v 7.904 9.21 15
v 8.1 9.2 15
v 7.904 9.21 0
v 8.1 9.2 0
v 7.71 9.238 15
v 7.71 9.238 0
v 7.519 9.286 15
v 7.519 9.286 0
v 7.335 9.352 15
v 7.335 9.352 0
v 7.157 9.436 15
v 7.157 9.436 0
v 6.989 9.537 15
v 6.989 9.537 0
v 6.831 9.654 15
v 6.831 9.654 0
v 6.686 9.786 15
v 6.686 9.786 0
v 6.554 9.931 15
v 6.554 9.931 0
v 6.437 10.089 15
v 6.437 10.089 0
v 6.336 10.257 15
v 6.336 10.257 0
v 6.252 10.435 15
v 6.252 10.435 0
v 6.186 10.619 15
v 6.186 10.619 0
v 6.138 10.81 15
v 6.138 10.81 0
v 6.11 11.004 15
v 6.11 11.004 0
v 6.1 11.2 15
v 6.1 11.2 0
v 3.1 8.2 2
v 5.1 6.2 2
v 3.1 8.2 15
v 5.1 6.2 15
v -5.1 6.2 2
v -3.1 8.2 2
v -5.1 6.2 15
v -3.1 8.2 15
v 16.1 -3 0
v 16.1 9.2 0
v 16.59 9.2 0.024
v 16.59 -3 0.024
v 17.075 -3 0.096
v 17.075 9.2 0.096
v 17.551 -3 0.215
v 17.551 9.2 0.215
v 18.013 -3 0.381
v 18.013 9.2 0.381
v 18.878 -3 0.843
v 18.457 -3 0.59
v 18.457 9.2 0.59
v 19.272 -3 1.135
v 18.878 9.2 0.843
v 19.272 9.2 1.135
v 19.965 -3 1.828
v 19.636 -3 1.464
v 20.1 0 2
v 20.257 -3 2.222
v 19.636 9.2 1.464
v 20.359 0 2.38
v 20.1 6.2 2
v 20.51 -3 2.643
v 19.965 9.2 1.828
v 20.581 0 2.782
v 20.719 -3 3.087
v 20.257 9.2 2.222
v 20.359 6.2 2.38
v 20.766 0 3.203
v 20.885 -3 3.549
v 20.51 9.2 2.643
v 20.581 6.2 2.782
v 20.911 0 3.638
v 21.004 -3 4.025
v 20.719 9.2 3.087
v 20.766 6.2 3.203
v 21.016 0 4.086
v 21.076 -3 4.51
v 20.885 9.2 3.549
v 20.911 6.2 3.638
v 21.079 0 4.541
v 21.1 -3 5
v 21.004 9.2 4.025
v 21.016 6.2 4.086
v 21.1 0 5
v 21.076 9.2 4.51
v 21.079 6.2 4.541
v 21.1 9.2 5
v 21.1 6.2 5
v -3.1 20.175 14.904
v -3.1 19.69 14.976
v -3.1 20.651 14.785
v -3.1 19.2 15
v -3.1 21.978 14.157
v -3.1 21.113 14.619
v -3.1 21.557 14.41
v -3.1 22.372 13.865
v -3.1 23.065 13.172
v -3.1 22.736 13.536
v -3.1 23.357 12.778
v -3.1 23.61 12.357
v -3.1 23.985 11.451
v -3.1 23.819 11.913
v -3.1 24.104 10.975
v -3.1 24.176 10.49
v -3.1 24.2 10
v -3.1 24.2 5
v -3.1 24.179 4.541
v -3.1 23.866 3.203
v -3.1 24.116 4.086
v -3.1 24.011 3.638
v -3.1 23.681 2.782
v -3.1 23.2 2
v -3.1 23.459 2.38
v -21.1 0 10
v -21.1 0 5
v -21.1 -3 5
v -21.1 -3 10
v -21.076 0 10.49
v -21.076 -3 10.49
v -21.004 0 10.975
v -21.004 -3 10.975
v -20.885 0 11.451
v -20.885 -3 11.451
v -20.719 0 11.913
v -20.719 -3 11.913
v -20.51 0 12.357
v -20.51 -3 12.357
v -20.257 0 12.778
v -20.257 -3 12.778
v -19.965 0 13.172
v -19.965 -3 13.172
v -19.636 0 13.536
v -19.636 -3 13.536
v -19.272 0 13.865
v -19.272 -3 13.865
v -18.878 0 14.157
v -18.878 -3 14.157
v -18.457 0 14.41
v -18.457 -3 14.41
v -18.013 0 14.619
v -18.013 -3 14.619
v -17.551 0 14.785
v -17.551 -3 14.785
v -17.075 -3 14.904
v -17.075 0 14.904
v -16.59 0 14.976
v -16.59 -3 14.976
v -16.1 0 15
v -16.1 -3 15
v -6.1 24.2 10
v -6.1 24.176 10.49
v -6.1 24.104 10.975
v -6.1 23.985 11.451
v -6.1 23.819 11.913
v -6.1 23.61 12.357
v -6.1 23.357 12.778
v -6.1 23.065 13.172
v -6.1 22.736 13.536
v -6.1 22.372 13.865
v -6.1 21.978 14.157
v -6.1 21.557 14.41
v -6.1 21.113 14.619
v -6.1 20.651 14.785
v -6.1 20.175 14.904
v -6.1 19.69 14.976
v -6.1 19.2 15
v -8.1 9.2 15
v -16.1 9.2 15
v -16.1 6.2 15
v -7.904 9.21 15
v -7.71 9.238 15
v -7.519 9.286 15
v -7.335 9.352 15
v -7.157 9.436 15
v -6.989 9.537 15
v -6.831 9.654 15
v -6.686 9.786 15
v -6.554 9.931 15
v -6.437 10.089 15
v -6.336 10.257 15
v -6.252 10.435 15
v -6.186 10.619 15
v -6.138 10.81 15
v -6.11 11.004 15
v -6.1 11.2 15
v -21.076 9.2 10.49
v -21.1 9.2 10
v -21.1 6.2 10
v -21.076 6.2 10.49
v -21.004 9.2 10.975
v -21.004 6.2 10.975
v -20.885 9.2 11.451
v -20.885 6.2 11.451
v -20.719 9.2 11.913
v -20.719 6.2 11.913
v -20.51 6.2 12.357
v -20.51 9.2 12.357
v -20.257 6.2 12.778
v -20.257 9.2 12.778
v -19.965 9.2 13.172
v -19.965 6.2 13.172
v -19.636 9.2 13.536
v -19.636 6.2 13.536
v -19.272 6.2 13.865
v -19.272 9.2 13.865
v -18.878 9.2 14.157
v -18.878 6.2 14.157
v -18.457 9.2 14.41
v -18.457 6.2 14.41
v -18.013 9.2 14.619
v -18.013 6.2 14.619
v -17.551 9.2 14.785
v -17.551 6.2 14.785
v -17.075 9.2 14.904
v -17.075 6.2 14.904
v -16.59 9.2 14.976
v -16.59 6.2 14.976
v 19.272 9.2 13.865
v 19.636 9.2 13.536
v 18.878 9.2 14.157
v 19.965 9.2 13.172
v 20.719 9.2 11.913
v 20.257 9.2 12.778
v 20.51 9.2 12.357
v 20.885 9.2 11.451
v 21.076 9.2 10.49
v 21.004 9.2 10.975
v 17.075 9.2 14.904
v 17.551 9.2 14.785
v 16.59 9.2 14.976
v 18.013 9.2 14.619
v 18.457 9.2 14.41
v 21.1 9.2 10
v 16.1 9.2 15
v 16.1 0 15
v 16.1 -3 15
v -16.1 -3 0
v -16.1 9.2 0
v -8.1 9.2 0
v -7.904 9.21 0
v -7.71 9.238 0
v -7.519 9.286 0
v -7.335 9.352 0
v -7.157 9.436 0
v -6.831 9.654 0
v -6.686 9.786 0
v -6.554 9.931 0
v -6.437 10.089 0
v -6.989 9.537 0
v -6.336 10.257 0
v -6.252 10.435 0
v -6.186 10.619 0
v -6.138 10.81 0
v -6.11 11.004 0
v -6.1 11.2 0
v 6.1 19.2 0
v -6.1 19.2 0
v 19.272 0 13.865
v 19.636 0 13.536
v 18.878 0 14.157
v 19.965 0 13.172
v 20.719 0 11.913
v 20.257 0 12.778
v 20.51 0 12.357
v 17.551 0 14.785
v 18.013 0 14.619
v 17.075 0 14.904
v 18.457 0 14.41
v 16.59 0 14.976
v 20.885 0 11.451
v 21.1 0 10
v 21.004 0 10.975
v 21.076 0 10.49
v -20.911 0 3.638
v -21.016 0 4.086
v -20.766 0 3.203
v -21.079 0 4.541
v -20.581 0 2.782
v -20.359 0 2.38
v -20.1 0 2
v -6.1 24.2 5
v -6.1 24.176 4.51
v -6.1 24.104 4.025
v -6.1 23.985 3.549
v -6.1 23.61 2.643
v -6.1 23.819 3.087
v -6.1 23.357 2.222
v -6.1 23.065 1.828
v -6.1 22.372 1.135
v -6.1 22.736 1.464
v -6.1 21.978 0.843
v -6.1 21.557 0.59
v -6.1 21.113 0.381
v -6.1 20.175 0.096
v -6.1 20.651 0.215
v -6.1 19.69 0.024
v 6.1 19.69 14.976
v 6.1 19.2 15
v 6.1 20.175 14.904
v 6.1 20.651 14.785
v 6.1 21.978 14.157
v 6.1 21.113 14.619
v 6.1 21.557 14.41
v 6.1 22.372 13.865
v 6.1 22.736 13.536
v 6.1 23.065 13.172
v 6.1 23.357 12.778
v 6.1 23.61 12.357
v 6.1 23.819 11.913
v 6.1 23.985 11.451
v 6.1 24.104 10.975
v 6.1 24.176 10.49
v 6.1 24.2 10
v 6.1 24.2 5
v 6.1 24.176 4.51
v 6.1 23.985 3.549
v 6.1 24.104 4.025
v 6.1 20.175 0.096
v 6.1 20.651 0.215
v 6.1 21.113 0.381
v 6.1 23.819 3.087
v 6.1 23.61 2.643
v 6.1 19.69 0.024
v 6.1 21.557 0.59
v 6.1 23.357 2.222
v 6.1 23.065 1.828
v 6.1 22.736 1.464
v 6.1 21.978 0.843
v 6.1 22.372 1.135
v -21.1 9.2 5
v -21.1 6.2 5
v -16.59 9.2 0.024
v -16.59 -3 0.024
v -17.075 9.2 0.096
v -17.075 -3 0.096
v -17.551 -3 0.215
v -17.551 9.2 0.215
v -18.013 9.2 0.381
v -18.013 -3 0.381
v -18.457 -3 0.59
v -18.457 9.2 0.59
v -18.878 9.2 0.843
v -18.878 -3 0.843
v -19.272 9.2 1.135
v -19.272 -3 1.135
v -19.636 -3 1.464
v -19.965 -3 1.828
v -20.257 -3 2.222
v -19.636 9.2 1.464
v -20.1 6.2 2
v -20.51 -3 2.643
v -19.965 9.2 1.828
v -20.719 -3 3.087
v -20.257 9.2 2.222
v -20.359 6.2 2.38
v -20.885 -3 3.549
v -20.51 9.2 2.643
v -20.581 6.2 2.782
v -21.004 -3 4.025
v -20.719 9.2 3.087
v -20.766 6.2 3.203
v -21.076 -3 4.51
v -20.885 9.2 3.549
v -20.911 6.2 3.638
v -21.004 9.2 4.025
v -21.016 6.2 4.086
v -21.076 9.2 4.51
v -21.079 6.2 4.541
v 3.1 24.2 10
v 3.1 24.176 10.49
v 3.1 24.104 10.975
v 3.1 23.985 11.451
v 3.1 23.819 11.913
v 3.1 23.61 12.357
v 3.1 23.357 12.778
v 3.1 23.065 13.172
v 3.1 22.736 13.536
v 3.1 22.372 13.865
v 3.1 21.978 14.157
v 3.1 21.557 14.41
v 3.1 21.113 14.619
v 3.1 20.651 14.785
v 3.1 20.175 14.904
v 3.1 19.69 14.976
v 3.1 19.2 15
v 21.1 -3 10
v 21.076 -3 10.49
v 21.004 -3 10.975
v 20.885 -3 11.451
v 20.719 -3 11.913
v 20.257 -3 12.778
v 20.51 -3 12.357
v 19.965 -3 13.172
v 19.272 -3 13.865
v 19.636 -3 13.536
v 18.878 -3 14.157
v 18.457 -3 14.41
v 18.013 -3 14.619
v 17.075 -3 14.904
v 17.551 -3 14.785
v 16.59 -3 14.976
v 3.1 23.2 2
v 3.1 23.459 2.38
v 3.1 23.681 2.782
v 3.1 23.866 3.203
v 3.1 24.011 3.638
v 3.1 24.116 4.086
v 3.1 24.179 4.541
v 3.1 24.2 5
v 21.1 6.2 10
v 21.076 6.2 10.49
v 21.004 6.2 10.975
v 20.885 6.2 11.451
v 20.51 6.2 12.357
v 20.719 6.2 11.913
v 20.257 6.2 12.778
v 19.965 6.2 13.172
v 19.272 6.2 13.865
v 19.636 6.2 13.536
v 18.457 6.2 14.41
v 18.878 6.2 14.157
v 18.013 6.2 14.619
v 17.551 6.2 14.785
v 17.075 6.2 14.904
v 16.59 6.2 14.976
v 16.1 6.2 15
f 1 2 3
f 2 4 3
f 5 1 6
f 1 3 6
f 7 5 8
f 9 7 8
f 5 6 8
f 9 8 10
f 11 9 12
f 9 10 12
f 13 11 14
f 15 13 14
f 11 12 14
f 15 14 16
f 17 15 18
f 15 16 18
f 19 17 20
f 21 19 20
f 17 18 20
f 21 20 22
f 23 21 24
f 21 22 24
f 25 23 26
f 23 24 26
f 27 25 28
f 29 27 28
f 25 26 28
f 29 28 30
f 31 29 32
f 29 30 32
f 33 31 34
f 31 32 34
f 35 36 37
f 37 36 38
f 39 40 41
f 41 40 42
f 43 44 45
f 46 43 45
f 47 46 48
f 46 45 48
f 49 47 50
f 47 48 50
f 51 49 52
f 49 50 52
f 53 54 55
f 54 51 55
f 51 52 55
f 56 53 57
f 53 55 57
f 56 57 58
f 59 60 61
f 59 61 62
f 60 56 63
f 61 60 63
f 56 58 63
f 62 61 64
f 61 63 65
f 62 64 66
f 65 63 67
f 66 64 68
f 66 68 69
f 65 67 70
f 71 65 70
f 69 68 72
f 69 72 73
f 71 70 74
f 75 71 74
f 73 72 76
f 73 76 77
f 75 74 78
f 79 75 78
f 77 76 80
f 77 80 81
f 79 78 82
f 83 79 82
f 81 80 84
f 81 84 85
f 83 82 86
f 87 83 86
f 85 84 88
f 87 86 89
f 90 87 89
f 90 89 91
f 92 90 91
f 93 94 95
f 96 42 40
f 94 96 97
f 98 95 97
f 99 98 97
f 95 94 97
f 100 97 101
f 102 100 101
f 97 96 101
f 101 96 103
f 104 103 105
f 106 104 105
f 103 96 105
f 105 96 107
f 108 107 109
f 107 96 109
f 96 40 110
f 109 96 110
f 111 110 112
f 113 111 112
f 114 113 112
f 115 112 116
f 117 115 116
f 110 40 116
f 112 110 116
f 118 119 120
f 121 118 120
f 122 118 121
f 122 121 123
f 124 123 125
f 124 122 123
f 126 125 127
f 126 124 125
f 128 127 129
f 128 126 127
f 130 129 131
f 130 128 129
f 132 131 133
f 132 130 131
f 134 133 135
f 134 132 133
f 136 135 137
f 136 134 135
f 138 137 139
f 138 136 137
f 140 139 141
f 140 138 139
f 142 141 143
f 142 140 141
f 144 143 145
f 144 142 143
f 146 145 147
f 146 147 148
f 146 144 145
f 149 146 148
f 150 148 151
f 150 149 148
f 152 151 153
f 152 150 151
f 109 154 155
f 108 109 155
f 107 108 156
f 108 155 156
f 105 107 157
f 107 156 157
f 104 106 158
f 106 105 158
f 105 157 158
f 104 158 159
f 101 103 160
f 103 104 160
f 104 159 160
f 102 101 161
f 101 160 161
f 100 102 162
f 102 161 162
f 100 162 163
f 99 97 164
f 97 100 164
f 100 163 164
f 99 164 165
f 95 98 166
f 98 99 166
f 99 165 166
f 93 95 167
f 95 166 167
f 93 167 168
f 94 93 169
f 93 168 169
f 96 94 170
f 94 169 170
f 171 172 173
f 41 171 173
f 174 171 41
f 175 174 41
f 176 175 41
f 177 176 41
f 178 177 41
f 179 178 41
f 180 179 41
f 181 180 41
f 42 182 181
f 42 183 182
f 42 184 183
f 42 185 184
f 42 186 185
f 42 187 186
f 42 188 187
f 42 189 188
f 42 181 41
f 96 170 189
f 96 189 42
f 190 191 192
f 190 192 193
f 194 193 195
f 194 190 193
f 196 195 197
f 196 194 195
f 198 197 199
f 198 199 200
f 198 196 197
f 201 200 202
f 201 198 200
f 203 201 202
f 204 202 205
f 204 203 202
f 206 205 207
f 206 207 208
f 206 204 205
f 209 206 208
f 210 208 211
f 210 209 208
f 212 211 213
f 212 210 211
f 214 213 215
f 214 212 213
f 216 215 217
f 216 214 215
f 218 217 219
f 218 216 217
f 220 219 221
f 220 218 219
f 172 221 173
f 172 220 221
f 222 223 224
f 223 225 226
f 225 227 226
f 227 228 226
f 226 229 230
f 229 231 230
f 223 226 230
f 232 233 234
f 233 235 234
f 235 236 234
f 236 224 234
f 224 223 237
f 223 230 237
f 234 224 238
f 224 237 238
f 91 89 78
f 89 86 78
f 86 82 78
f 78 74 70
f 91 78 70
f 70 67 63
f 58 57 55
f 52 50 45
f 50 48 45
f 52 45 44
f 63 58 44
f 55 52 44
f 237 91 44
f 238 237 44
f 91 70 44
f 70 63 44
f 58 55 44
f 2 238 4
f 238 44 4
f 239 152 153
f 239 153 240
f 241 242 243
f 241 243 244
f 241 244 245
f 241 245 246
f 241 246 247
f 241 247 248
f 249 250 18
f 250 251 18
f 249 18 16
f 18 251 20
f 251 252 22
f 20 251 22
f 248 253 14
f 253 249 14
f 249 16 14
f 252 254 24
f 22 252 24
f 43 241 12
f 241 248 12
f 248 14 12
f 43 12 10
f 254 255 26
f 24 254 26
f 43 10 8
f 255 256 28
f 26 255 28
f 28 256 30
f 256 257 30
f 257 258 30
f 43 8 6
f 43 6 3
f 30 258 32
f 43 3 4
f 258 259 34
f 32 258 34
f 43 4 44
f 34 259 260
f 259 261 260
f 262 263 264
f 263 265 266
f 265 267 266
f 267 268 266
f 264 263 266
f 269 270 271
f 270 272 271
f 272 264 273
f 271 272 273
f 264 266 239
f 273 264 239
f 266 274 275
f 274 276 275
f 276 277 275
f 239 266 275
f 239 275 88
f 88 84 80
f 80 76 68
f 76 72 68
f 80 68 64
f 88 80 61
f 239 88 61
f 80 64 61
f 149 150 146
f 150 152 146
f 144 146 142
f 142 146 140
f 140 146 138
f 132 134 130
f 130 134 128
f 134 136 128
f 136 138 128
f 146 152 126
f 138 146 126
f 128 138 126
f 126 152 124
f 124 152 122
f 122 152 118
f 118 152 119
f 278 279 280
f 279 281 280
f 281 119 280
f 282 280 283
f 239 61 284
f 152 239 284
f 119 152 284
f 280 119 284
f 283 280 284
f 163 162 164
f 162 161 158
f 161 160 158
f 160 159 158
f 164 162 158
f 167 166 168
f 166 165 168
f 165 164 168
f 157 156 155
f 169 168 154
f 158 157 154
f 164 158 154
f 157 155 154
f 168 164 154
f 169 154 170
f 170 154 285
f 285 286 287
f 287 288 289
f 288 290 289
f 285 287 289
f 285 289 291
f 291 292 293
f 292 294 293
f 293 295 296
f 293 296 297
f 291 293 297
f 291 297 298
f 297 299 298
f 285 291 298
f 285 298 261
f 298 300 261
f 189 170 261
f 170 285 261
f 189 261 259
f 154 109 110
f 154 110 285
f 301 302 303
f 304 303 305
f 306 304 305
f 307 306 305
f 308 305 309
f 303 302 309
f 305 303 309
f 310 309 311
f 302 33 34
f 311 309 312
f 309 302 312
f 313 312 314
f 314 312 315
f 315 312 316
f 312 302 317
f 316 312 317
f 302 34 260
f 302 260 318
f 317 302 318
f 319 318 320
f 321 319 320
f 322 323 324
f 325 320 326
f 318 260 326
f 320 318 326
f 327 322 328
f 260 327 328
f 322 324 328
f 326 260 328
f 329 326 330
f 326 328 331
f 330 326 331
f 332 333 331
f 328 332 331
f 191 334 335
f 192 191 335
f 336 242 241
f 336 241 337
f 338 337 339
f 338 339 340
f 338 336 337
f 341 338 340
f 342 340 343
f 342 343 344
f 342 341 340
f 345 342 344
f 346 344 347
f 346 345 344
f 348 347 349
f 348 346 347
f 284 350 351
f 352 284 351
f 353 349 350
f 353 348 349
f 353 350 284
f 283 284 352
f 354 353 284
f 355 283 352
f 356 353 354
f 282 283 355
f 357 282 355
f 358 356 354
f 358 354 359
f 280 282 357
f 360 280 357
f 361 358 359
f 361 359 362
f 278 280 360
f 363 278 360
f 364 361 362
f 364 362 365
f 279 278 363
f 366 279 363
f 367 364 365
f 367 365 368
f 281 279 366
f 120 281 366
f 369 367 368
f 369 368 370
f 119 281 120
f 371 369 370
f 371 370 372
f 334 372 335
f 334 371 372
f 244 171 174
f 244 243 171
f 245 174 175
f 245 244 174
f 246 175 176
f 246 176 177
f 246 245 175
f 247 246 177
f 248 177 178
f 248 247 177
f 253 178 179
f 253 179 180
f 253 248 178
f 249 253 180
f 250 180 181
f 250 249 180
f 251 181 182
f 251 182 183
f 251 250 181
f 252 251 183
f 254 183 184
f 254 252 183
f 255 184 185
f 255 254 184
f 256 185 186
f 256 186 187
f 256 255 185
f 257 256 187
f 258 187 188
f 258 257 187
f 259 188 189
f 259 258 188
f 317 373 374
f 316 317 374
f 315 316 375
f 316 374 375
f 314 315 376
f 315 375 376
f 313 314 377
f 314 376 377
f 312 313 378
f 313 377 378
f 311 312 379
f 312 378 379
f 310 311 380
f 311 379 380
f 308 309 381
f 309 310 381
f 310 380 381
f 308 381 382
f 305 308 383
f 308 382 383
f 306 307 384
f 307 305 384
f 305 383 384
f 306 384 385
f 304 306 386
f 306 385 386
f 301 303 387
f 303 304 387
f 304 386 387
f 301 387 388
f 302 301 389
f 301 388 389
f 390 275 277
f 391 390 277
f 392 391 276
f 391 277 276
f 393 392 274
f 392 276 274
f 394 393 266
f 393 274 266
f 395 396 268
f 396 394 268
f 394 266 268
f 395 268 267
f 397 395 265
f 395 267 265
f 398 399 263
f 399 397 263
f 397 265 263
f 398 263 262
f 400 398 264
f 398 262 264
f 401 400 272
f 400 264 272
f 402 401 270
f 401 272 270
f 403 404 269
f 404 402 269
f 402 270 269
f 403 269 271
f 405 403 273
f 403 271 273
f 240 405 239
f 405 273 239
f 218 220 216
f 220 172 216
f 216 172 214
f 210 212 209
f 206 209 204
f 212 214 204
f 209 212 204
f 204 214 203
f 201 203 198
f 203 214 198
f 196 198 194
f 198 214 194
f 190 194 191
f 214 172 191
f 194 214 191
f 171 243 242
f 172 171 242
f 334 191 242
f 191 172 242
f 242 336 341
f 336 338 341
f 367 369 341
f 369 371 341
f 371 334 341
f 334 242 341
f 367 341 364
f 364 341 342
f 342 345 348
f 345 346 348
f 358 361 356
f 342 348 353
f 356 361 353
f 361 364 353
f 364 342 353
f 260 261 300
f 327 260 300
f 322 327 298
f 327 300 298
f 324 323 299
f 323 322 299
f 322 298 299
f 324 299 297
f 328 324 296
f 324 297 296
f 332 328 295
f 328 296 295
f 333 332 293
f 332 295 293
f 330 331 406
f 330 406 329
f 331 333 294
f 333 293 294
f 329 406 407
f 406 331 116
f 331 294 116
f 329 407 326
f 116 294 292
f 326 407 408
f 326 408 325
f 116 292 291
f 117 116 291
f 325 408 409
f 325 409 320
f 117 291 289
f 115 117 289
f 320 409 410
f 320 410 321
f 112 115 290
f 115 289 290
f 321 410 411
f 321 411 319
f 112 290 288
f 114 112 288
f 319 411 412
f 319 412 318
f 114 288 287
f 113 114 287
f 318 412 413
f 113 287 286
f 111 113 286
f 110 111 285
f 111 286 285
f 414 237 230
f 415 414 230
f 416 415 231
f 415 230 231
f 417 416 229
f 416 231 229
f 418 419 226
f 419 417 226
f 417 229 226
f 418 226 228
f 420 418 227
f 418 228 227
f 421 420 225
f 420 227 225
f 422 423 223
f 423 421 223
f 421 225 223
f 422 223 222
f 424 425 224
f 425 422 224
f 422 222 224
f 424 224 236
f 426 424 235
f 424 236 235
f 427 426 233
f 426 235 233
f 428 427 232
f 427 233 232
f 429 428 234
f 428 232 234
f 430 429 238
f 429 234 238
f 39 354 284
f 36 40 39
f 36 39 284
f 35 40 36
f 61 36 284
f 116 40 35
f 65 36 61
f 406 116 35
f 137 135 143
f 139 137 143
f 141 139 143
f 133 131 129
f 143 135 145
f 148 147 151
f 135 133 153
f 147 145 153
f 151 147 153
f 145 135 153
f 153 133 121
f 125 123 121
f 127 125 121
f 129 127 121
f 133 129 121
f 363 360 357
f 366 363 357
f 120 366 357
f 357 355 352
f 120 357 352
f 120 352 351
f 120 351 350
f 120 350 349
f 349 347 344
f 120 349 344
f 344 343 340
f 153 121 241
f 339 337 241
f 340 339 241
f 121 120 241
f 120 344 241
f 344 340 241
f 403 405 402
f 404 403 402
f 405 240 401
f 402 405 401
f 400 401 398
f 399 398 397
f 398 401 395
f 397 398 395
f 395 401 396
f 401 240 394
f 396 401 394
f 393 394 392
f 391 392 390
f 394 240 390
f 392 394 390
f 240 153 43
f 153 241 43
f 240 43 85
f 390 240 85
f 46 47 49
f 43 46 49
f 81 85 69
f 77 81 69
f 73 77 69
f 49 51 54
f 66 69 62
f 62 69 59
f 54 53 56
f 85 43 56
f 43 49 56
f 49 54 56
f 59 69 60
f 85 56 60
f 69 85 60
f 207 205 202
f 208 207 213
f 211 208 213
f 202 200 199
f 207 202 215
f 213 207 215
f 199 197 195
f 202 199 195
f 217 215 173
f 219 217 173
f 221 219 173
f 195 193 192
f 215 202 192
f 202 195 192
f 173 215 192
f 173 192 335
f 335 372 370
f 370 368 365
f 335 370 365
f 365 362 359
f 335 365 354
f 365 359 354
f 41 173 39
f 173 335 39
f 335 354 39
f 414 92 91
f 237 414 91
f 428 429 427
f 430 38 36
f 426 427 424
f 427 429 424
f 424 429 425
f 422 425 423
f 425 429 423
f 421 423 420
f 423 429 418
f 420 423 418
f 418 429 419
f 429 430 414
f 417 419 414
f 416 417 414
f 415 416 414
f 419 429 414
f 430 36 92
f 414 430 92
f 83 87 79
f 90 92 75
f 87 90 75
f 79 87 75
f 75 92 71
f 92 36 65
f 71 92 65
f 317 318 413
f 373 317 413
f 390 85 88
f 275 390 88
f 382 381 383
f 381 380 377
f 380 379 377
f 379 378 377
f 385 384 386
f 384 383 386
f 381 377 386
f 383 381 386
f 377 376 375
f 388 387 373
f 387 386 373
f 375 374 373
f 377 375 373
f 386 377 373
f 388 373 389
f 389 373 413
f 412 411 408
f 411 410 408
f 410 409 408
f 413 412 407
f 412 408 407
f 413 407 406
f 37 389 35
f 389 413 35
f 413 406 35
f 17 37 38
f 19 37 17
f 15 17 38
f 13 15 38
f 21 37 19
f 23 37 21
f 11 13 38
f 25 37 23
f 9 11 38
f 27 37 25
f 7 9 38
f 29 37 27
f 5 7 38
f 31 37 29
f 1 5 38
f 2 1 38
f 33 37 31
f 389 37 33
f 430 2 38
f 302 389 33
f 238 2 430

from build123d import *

# Parameters (mm, degrees)
F1_DEPTH     = 2
F2_DEPTH     = 15
F3_R         = 2
F4_T1_DEPTH  = 28
F4_T3_DEPTH  = 28
F4_T5_DEPTH  = 28
F4_T7_DEPTH  = 28
F4_T9_DEPTH  = 37.2
F4_T11_DEPTH = 37.2
F5_R         = 2
F6_SIZE      = 2


# Not quite as in the source:
# - a fillet or chamfer that OpenCascade refuses, or shapes differently, is made with other operations: its cross-section is extruded or revolved along the edge and cut away or added


with BuildPart() as f1:
    # F0 (on Top) → F1 (new body)
    with BuildSketch(Plane.XY):
        Polygon((-21.1, 0), (0, 0), (21.1, 0), (21.1, 6.2), (3.1, 6.2), (3.1, 24.2), (-3.1, 24.2), (-3.1, 6.2), (-21.1, 6.2), align=None)
        Polygon((21.1, 0), (0, 0), (-21.1, 0), (-21.1, -3), (0, -3), (21.1, -3), align=None)
        Polygon((3.1, 6.2), (21.1, 6.2), (21.1, 9.2), (6.1, 9.2), (6.1, 24.2), (3.1, 24.2), align=None)
        Polygon((-21.1, 9.2), (-21.1, 6.2), (-3.1, 6.2), (-3.1, 24.2), (-6.1, 24.2), (-6.1, 9.2), align=None)
    extrude(amount=F1_DEPTH)

    # F0 (on Top) → F2 (join)
    with BuildSketch(Plane.XY):
        Polygon((-21.1, 9.2), (-21.1, 6.2), (-3.1, 6.2), (-3.1, 24.2), (-6.1, 24.2), (-6.1, 9.2), align=None)
        Polygon((3.1, 6.2), (21.1, 6.2), (21.1, 9.2), (6.1, 9.2), (6.1, 24.2), (3.1, 24.2), align=None)
        Polygon((21.1, 0), (0, 0), (-21.1, 0), (-21.1, -3), (0, -3), (21.1, -3), align=None)
    extrude(amount=F2_DEPTH)

    # F3
    f3_edges = [f1.edges().sort_by_distance(p)[0] for p in [
        (6.1, 9.2, 7.5),
    ]]
    fillet(f3_edges, radius=F3_R)

    # F4: fillet of radius 5 on 9 edges, made by hand

    # F4_s2 → F4_t1 (cut)
    with BuildSketch(Plane.XZ.offset(-12.5)):
        with BuildLine():
            ThreePointArc((21.1, 10), (19.6355339059, 13.5355339059), (16.1, 15))
            Line((16.1, 15), (21.1, 15))
            Line((21.1, 15), (21.1, 10))
        make_face()
        with BuildLine():
            ThreePointArc((-21.1, 10), (-19.6355339059, 13.5355339059), (-16.1, 15))
            Line((-16.1, 15), (-21.1, 15))
            Line((-21.1, 15), (-21.1, 10))
        make_face()
    extrude(amount=F4_T1_DEPTH, mode=Mode.SUBTRACT)

    # F4_s4 → F4_t3 (cut)
    with BuildSketch(Plane.XZ.offset(-21.7)):
        with BuildLine():
            ThreePointArc((21.1, 10), (19.6355339059, 13.5355339059), (16.1, 15))
            Line((16.1, 15), (21.1, 15))
            Line((21.1, 15), (21.1, 10))
        make_face()
        with BuildLine():
            ThreePointArc((-21.1, 10), (-19.6355339059, 13.5355339059), (-16.1, 15))
            Line((-16.1, 15), (-21.1, 15))
            Line((-21.1, 15), (-21.1, 10))
        make_face()
    extrude(amount=F4_T3_DEPTH, mode=Mode.SUBTRACT)

    # F4_s6 → F4_t5 (cut)
    with BuildSketch(Plane.YZ.offset(-18.6)):
        with BuildLine():
            ThreePointArc((24.2, 10), (22.7355339059, 13.5355339059), (19.2, 15))
            Line((19.2, 15), (24.2, 15))
            Line((24.2, 15), (24.2, 10))
        make_face()
    extrude(amount=F4_T5_DEPTH, mode=Mode.SUBTRACT)

    # F4_s8 → F4_t7 (cut)
    with BuildSketch(Plane.YZ.offset(-9.4)):
        with BuildLine():
            ThreePointArc((24.2, 10), (22.7355339059, 13.5355339059), (19.2, 15))
            Line((19.2, 15), (24.2, 15))
            Line((24.2, 15), (24.2, 10))
        make_face()
    extrude(amount=F4_T7_DEPTH, mode=Mode.SUBTRACT)

    # F4_s10 → F4_t9 (cut)
    with BuildSketch(Plane.XZ.offset(-21.7)):
        with BuildLine():
            ThreePointArc((-16.1, 0), (-19.6355339059, 1.4644660941), (-21.1, 5))
            Line((-21.1, 5), (-21.1, 0))
            Line((-21.1, 0), (-16.1, 0))
        make_face()
        with BuildLine():
            ThreePointArc((16.1, 0), (19.6355339059, 1.4644660941), (21.1, 5))
            Line((21.1, 5), (21.1, 0))
            Line((21.1, 0), (16.1, 0))
        make_face()
    extrude(amount=F4_T9_DEPTH, mode=Mode.SUBTRACT)

    # F4_s12 → F4_t11 (cut)
    with BuildSketch(Plane.YZ.offset(-18.6)):
        with BuildLine():
            ThreePointArc((19.2, 0), (22.7355339059, 1.4644660941), (24.2, 5))
            Line((24.2, 5), (24.2, 0))
            Line((24.2, 0), (19.2, 0))
        make_face()
    extrude(amount=F4_T11_DEPTH, mode=Mode.SUBTRACT)

    # F5
    f5_edges = [f1.edges().sort_by_distance(p)[0] for p in [
        (-6.1, 9.2, 7.5),
    ]]
    fillet(f5_edges, radius=F5_R)

    # F6
    f6_edges = [f1.edges().sort_by_distance(p)[0] for p in [
        (3.1, 6.2, 8.5),
        (-3.1, 6.2, 8.5),
    ]]
    chamfer(f6_edges, length=F6_SIZE)


solid = f1.part
